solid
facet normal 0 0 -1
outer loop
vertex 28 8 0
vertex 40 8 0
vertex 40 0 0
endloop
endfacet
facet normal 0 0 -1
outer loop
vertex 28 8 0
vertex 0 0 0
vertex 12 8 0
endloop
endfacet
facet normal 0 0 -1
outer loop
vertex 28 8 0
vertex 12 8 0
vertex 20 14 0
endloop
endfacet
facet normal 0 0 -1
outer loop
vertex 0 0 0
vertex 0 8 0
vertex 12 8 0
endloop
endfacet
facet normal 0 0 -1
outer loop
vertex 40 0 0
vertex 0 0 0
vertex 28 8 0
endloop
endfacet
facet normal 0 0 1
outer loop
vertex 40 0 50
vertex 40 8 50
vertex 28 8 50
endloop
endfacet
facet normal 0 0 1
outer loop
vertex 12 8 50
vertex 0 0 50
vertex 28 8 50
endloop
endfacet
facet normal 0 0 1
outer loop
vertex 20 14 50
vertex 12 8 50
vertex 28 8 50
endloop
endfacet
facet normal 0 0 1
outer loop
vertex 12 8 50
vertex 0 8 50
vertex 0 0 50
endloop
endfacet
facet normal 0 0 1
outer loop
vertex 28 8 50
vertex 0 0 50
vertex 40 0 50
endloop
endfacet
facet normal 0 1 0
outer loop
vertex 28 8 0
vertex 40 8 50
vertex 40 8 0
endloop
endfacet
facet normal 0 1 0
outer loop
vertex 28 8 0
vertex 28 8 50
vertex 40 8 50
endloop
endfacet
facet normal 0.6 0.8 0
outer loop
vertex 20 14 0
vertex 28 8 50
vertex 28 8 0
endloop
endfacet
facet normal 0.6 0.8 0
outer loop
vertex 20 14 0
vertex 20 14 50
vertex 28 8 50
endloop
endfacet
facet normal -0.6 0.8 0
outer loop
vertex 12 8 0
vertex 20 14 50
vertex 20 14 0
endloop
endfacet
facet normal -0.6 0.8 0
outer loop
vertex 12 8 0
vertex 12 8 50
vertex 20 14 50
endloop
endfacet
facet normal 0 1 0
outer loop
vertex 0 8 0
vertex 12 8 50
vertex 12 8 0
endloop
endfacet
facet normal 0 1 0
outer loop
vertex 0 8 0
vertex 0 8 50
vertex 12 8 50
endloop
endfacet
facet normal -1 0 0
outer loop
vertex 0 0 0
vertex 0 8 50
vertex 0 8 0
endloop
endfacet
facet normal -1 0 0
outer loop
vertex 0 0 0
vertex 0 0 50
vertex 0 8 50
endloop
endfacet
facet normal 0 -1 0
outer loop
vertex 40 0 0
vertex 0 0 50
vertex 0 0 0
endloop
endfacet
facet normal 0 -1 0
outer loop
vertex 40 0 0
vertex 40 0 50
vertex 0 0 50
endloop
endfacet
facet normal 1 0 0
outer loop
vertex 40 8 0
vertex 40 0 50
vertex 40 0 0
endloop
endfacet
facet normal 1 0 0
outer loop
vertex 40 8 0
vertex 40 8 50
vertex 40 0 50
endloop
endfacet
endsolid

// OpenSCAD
$fn = 32;

// ----------------------------------------------------------------------
// V guide rail: vrib, 40 mm wide
// ----------------------------------------------------------------------

// --- parameters (mm) ---
rail_w = 40;              // rail width, X
base_t = 8;               // base plate thickness
v_depth = 6;              // V feature depth / height
v_half_w = 8;             // half width of the V at the base face
plate_t = 50;             // rail length, Z (the extrusion height)

profile = [[0, 0], [40, 0], [40, 8], [28, 8], [20, 14], [12, 8], [0, 8]];  // primary outline, 7 points, counter clockwise

// --- the one profile operation ---
linear_extrude(height = plate_t) polygon(points = profile);
